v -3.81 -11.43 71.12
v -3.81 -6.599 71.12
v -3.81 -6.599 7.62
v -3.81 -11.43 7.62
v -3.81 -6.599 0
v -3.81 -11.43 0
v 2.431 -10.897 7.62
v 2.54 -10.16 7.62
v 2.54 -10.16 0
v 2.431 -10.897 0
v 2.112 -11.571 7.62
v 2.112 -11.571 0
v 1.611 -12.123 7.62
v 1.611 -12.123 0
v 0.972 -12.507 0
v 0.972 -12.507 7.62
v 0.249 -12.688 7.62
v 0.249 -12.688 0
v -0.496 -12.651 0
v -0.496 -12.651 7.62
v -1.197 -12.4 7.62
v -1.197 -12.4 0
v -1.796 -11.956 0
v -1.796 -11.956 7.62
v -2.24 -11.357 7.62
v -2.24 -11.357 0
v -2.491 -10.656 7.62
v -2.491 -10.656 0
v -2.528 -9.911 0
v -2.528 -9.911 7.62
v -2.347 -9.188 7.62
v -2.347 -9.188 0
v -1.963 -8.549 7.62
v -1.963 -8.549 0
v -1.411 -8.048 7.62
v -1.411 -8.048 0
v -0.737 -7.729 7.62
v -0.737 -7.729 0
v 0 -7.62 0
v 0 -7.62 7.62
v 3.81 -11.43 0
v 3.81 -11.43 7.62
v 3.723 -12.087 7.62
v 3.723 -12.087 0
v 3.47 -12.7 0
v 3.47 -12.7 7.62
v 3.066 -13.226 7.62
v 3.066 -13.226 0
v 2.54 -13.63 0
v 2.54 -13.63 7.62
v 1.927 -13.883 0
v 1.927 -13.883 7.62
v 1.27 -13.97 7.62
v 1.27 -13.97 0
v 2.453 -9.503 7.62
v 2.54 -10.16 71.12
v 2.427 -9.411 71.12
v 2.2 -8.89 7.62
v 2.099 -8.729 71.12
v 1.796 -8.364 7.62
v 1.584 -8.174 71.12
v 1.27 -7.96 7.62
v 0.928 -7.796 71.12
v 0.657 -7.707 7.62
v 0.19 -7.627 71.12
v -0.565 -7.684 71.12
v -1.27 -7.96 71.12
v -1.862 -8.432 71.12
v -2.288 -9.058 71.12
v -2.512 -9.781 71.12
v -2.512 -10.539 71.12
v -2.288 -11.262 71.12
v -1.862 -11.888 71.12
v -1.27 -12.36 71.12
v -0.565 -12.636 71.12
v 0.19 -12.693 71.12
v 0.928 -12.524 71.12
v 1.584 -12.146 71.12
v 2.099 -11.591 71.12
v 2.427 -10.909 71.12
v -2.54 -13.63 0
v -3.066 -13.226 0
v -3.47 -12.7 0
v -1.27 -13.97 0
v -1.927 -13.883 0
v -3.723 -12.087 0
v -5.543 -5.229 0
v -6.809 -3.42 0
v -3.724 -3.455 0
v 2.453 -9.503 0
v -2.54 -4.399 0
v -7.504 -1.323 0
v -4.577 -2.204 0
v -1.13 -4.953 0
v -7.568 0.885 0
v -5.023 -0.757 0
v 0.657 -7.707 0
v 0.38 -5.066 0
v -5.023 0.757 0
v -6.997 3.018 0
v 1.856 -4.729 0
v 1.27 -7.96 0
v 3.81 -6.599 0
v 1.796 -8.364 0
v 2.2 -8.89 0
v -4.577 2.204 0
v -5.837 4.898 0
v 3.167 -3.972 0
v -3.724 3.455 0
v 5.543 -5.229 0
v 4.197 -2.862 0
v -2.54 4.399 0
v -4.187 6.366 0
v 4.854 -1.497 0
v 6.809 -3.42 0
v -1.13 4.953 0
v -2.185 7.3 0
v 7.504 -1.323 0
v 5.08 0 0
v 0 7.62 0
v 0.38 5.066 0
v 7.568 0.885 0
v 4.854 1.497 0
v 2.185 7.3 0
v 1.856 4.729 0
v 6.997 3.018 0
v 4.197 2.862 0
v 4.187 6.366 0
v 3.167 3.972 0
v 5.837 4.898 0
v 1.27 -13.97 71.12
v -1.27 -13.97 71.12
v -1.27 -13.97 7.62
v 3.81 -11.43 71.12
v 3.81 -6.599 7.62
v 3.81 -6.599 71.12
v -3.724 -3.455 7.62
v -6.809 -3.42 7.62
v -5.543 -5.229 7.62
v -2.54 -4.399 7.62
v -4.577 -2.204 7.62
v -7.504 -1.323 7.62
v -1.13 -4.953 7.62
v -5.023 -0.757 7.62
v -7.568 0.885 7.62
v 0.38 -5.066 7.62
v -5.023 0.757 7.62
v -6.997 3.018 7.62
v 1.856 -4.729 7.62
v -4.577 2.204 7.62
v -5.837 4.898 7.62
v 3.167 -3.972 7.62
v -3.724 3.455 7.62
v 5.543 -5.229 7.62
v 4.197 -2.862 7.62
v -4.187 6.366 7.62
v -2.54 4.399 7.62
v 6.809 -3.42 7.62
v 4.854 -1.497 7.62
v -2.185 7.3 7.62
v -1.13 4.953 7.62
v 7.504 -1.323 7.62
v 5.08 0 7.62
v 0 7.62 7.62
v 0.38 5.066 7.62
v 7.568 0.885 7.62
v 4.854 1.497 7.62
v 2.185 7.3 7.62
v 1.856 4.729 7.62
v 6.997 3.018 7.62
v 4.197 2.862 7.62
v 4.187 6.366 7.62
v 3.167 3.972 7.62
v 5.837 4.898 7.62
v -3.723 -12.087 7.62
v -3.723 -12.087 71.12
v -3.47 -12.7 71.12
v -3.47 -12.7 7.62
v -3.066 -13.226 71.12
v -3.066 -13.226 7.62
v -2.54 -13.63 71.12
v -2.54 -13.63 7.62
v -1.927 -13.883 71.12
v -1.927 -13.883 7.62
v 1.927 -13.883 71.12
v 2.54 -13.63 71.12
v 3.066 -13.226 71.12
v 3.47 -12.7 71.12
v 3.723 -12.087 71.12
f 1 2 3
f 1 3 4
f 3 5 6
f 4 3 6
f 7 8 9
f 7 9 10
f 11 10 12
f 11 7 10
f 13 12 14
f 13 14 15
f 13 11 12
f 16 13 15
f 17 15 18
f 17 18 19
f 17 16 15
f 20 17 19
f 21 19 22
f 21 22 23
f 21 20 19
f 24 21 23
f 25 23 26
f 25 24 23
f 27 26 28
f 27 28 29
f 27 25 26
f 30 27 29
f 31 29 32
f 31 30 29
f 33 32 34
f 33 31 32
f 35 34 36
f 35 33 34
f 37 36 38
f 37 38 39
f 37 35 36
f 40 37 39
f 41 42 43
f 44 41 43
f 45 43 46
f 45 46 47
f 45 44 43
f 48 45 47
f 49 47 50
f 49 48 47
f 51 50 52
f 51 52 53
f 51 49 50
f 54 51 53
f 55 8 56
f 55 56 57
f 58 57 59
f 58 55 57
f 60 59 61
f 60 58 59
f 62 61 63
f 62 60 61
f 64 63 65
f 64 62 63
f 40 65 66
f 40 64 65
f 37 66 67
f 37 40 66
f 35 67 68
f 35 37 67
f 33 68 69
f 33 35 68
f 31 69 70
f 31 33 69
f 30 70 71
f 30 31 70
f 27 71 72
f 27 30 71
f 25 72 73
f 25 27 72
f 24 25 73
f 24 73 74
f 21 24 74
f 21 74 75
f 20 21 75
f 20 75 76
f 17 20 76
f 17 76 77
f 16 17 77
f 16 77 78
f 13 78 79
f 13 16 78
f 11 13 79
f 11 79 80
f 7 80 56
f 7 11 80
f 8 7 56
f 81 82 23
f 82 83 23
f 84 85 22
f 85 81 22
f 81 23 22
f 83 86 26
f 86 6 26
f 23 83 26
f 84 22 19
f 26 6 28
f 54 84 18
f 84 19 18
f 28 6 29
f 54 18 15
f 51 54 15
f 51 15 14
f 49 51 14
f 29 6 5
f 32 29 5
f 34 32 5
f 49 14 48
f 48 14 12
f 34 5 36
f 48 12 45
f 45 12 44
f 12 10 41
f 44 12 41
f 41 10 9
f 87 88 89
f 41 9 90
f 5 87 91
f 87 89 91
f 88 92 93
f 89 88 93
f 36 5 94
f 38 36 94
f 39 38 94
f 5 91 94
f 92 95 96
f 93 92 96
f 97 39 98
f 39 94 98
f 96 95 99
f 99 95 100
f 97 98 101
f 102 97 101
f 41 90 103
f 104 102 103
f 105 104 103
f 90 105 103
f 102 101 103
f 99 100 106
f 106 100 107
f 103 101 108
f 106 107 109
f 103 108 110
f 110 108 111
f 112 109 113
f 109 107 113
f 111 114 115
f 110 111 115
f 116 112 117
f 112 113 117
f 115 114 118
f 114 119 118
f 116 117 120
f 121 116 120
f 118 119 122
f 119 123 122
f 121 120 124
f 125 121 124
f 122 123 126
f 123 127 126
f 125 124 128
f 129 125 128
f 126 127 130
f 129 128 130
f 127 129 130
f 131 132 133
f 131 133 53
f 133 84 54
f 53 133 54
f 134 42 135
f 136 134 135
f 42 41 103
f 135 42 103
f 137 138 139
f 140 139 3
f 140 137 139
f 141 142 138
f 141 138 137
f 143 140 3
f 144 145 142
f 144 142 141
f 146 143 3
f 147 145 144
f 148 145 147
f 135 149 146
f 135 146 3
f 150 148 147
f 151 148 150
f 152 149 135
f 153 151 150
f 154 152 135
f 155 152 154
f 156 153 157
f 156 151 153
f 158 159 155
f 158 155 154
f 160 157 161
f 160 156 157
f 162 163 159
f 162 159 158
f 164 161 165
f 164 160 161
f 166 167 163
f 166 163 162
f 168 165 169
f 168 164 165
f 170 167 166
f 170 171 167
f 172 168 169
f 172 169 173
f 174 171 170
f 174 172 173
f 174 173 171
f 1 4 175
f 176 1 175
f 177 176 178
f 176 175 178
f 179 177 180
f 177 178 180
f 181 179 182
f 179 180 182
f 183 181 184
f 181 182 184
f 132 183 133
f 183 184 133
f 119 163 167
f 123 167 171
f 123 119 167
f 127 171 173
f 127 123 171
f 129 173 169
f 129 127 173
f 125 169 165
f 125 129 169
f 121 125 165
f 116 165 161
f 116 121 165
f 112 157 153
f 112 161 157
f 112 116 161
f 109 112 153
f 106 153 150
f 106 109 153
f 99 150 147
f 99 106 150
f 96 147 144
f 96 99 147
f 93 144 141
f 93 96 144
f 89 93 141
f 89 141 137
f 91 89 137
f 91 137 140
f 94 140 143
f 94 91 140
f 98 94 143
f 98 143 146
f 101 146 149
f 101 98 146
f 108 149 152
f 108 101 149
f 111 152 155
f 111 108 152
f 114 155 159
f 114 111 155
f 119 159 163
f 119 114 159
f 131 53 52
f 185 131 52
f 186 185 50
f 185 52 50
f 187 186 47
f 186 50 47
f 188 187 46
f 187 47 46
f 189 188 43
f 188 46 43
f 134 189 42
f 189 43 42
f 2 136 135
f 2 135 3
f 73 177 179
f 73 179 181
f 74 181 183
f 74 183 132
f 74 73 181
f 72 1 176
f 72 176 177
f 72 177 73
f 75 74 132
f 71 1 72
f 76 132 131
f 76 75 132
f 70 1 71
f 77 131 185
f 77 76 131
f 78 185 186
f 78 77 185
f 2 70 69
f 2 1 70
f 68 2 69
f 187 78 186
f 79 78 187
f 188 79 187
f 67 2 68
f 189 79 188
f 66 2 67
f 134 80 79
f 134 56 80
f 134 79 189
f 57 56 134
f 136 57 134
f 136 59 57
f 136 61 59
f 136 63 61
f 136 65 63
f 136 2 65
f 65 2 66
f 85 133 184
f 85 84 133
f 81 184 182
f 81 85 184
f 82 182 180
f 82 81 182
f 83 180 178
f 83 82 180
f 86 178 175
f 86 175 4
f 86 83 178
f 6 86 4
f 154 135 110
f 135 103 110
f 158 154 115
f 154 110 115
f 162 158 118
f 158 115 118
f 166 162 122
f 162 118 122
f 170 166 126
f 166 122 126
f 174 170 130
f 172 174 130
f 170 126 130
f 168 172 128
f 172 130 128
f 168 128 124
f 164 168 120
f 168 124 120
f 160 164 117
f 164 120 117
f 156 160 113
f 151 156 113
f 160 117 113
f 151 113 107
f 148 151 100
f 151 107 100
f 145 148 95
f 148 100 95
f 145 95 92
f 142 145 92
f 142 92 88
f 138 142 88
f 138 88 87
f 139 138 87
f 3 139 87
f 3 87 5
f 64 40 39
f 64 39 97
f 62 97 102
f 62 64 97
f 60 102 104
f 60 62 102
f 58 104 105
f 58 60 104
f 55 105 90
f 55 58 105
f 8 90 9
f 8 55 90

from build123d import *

# Parameters (mm, degrees)
F0_R     = 7.62
F0_R_2   = 5.08
F1_DEPTH = 7.62
F3_DEPTH = 7.62
F4_R     = 2.54
F5_R     = 2.54
F6_DEPTH = 63.5


with BuildPart() as f1:
    # F0 (on Top) → F1 (new body)
    with BuildSketch(Plane.XY):
        Circle(F0_R)
        Circle(F0_R_2, mode=Mode.SUBTRACT)
    extrude(amount=F1_DEPTH)

    # F2 (on face) → F3 (join)
    with BuildSketch(Plane.XY.offset(7.62)):
        with BuildLine():
            ThreePointArc((3.7e-09, -7.62), (-1.9722011219, -7.3603547968), (-3.81, -6.5991135768))
            Line((-3.81, -6.5991135768), (-3.81, -13.97))
            Line((-3.81, -13.97), (3.81, -13.97))
            Line((3.81, -13.97), (3.81, -6.5991135768))
            ThreePointArc((3.81, -6.5991135768), (1.9722011255, -7.3603547958), (3.7e-09, -7.62))
        make_face()
        with BuildLine():
            ThreePointArc((2.54, -10.16), (-1.7960512255, -11.9560512229), (3.7e-09, -7.62))
            ThreePointArc((3.7e-09, -7.62), (1.7960512255, -8.3639487771), (2.54, -10.16))
        make_face(mode=Mode.SUBTRACT)
        with BuildLine():
            Line((0, -5.08), (-3.81, -5.08))
            Line((-3.81, -5.08), (-3.81, -6.5991135768))
            ThreePointArc((-3.81, -6.5991135768), (-1.9722011219, -7.3603547968), (3.7e-09, -7.62))
            ThreePointArc((3.7e-09, -7.62), (1.9722011255, -7.3603547958), (3.81, -6.5991135768))
            Line((3.81, -6.5991135768), (3.81, -5.08))
            Line((3.81, -5.08), (0, -5.08))
        make_face()
    extrude(amount=-F3_DEPTH)

    # F4
    f4_edges = [f1.edges().sort_by_distance(p)[0] for p in [
        (3.81, -13.97, 3.81),
        (-3.81, -13.97, 3.81),
    ]]
    fillet(f4_edges, radius=F4_R)

    # F5 (on face) → F6 (join)
    with BuildSketch(Plane.XY.offset(7.62)):
        with BuildLine():
            Line((3.81, -6.5991135768), (-3.81, -6.5991135768))
            Line((-3.81, -6.5991135768), (-3.81, -11.43))
            ThreePointArc((-3.81, -11.43), (-3.0660512242, -13.2260512242), (-1.27, -13.97))
            Line((-1.27, -13.97), (1.27, -13.97))
            ThreePointArc((1.27, -13.97), (3.0660512242, -13.2260512242), (3.81, -11.43))
            Line((3.81, -11.43), (3.81, -6.5991135768))
        make_face()
        with Locations((0, -10.16)):
            Circle(F5_R, mode=Mode.SUBTRACT)
    extrude(amount=F6_DEPTH)


solid = f1.part
